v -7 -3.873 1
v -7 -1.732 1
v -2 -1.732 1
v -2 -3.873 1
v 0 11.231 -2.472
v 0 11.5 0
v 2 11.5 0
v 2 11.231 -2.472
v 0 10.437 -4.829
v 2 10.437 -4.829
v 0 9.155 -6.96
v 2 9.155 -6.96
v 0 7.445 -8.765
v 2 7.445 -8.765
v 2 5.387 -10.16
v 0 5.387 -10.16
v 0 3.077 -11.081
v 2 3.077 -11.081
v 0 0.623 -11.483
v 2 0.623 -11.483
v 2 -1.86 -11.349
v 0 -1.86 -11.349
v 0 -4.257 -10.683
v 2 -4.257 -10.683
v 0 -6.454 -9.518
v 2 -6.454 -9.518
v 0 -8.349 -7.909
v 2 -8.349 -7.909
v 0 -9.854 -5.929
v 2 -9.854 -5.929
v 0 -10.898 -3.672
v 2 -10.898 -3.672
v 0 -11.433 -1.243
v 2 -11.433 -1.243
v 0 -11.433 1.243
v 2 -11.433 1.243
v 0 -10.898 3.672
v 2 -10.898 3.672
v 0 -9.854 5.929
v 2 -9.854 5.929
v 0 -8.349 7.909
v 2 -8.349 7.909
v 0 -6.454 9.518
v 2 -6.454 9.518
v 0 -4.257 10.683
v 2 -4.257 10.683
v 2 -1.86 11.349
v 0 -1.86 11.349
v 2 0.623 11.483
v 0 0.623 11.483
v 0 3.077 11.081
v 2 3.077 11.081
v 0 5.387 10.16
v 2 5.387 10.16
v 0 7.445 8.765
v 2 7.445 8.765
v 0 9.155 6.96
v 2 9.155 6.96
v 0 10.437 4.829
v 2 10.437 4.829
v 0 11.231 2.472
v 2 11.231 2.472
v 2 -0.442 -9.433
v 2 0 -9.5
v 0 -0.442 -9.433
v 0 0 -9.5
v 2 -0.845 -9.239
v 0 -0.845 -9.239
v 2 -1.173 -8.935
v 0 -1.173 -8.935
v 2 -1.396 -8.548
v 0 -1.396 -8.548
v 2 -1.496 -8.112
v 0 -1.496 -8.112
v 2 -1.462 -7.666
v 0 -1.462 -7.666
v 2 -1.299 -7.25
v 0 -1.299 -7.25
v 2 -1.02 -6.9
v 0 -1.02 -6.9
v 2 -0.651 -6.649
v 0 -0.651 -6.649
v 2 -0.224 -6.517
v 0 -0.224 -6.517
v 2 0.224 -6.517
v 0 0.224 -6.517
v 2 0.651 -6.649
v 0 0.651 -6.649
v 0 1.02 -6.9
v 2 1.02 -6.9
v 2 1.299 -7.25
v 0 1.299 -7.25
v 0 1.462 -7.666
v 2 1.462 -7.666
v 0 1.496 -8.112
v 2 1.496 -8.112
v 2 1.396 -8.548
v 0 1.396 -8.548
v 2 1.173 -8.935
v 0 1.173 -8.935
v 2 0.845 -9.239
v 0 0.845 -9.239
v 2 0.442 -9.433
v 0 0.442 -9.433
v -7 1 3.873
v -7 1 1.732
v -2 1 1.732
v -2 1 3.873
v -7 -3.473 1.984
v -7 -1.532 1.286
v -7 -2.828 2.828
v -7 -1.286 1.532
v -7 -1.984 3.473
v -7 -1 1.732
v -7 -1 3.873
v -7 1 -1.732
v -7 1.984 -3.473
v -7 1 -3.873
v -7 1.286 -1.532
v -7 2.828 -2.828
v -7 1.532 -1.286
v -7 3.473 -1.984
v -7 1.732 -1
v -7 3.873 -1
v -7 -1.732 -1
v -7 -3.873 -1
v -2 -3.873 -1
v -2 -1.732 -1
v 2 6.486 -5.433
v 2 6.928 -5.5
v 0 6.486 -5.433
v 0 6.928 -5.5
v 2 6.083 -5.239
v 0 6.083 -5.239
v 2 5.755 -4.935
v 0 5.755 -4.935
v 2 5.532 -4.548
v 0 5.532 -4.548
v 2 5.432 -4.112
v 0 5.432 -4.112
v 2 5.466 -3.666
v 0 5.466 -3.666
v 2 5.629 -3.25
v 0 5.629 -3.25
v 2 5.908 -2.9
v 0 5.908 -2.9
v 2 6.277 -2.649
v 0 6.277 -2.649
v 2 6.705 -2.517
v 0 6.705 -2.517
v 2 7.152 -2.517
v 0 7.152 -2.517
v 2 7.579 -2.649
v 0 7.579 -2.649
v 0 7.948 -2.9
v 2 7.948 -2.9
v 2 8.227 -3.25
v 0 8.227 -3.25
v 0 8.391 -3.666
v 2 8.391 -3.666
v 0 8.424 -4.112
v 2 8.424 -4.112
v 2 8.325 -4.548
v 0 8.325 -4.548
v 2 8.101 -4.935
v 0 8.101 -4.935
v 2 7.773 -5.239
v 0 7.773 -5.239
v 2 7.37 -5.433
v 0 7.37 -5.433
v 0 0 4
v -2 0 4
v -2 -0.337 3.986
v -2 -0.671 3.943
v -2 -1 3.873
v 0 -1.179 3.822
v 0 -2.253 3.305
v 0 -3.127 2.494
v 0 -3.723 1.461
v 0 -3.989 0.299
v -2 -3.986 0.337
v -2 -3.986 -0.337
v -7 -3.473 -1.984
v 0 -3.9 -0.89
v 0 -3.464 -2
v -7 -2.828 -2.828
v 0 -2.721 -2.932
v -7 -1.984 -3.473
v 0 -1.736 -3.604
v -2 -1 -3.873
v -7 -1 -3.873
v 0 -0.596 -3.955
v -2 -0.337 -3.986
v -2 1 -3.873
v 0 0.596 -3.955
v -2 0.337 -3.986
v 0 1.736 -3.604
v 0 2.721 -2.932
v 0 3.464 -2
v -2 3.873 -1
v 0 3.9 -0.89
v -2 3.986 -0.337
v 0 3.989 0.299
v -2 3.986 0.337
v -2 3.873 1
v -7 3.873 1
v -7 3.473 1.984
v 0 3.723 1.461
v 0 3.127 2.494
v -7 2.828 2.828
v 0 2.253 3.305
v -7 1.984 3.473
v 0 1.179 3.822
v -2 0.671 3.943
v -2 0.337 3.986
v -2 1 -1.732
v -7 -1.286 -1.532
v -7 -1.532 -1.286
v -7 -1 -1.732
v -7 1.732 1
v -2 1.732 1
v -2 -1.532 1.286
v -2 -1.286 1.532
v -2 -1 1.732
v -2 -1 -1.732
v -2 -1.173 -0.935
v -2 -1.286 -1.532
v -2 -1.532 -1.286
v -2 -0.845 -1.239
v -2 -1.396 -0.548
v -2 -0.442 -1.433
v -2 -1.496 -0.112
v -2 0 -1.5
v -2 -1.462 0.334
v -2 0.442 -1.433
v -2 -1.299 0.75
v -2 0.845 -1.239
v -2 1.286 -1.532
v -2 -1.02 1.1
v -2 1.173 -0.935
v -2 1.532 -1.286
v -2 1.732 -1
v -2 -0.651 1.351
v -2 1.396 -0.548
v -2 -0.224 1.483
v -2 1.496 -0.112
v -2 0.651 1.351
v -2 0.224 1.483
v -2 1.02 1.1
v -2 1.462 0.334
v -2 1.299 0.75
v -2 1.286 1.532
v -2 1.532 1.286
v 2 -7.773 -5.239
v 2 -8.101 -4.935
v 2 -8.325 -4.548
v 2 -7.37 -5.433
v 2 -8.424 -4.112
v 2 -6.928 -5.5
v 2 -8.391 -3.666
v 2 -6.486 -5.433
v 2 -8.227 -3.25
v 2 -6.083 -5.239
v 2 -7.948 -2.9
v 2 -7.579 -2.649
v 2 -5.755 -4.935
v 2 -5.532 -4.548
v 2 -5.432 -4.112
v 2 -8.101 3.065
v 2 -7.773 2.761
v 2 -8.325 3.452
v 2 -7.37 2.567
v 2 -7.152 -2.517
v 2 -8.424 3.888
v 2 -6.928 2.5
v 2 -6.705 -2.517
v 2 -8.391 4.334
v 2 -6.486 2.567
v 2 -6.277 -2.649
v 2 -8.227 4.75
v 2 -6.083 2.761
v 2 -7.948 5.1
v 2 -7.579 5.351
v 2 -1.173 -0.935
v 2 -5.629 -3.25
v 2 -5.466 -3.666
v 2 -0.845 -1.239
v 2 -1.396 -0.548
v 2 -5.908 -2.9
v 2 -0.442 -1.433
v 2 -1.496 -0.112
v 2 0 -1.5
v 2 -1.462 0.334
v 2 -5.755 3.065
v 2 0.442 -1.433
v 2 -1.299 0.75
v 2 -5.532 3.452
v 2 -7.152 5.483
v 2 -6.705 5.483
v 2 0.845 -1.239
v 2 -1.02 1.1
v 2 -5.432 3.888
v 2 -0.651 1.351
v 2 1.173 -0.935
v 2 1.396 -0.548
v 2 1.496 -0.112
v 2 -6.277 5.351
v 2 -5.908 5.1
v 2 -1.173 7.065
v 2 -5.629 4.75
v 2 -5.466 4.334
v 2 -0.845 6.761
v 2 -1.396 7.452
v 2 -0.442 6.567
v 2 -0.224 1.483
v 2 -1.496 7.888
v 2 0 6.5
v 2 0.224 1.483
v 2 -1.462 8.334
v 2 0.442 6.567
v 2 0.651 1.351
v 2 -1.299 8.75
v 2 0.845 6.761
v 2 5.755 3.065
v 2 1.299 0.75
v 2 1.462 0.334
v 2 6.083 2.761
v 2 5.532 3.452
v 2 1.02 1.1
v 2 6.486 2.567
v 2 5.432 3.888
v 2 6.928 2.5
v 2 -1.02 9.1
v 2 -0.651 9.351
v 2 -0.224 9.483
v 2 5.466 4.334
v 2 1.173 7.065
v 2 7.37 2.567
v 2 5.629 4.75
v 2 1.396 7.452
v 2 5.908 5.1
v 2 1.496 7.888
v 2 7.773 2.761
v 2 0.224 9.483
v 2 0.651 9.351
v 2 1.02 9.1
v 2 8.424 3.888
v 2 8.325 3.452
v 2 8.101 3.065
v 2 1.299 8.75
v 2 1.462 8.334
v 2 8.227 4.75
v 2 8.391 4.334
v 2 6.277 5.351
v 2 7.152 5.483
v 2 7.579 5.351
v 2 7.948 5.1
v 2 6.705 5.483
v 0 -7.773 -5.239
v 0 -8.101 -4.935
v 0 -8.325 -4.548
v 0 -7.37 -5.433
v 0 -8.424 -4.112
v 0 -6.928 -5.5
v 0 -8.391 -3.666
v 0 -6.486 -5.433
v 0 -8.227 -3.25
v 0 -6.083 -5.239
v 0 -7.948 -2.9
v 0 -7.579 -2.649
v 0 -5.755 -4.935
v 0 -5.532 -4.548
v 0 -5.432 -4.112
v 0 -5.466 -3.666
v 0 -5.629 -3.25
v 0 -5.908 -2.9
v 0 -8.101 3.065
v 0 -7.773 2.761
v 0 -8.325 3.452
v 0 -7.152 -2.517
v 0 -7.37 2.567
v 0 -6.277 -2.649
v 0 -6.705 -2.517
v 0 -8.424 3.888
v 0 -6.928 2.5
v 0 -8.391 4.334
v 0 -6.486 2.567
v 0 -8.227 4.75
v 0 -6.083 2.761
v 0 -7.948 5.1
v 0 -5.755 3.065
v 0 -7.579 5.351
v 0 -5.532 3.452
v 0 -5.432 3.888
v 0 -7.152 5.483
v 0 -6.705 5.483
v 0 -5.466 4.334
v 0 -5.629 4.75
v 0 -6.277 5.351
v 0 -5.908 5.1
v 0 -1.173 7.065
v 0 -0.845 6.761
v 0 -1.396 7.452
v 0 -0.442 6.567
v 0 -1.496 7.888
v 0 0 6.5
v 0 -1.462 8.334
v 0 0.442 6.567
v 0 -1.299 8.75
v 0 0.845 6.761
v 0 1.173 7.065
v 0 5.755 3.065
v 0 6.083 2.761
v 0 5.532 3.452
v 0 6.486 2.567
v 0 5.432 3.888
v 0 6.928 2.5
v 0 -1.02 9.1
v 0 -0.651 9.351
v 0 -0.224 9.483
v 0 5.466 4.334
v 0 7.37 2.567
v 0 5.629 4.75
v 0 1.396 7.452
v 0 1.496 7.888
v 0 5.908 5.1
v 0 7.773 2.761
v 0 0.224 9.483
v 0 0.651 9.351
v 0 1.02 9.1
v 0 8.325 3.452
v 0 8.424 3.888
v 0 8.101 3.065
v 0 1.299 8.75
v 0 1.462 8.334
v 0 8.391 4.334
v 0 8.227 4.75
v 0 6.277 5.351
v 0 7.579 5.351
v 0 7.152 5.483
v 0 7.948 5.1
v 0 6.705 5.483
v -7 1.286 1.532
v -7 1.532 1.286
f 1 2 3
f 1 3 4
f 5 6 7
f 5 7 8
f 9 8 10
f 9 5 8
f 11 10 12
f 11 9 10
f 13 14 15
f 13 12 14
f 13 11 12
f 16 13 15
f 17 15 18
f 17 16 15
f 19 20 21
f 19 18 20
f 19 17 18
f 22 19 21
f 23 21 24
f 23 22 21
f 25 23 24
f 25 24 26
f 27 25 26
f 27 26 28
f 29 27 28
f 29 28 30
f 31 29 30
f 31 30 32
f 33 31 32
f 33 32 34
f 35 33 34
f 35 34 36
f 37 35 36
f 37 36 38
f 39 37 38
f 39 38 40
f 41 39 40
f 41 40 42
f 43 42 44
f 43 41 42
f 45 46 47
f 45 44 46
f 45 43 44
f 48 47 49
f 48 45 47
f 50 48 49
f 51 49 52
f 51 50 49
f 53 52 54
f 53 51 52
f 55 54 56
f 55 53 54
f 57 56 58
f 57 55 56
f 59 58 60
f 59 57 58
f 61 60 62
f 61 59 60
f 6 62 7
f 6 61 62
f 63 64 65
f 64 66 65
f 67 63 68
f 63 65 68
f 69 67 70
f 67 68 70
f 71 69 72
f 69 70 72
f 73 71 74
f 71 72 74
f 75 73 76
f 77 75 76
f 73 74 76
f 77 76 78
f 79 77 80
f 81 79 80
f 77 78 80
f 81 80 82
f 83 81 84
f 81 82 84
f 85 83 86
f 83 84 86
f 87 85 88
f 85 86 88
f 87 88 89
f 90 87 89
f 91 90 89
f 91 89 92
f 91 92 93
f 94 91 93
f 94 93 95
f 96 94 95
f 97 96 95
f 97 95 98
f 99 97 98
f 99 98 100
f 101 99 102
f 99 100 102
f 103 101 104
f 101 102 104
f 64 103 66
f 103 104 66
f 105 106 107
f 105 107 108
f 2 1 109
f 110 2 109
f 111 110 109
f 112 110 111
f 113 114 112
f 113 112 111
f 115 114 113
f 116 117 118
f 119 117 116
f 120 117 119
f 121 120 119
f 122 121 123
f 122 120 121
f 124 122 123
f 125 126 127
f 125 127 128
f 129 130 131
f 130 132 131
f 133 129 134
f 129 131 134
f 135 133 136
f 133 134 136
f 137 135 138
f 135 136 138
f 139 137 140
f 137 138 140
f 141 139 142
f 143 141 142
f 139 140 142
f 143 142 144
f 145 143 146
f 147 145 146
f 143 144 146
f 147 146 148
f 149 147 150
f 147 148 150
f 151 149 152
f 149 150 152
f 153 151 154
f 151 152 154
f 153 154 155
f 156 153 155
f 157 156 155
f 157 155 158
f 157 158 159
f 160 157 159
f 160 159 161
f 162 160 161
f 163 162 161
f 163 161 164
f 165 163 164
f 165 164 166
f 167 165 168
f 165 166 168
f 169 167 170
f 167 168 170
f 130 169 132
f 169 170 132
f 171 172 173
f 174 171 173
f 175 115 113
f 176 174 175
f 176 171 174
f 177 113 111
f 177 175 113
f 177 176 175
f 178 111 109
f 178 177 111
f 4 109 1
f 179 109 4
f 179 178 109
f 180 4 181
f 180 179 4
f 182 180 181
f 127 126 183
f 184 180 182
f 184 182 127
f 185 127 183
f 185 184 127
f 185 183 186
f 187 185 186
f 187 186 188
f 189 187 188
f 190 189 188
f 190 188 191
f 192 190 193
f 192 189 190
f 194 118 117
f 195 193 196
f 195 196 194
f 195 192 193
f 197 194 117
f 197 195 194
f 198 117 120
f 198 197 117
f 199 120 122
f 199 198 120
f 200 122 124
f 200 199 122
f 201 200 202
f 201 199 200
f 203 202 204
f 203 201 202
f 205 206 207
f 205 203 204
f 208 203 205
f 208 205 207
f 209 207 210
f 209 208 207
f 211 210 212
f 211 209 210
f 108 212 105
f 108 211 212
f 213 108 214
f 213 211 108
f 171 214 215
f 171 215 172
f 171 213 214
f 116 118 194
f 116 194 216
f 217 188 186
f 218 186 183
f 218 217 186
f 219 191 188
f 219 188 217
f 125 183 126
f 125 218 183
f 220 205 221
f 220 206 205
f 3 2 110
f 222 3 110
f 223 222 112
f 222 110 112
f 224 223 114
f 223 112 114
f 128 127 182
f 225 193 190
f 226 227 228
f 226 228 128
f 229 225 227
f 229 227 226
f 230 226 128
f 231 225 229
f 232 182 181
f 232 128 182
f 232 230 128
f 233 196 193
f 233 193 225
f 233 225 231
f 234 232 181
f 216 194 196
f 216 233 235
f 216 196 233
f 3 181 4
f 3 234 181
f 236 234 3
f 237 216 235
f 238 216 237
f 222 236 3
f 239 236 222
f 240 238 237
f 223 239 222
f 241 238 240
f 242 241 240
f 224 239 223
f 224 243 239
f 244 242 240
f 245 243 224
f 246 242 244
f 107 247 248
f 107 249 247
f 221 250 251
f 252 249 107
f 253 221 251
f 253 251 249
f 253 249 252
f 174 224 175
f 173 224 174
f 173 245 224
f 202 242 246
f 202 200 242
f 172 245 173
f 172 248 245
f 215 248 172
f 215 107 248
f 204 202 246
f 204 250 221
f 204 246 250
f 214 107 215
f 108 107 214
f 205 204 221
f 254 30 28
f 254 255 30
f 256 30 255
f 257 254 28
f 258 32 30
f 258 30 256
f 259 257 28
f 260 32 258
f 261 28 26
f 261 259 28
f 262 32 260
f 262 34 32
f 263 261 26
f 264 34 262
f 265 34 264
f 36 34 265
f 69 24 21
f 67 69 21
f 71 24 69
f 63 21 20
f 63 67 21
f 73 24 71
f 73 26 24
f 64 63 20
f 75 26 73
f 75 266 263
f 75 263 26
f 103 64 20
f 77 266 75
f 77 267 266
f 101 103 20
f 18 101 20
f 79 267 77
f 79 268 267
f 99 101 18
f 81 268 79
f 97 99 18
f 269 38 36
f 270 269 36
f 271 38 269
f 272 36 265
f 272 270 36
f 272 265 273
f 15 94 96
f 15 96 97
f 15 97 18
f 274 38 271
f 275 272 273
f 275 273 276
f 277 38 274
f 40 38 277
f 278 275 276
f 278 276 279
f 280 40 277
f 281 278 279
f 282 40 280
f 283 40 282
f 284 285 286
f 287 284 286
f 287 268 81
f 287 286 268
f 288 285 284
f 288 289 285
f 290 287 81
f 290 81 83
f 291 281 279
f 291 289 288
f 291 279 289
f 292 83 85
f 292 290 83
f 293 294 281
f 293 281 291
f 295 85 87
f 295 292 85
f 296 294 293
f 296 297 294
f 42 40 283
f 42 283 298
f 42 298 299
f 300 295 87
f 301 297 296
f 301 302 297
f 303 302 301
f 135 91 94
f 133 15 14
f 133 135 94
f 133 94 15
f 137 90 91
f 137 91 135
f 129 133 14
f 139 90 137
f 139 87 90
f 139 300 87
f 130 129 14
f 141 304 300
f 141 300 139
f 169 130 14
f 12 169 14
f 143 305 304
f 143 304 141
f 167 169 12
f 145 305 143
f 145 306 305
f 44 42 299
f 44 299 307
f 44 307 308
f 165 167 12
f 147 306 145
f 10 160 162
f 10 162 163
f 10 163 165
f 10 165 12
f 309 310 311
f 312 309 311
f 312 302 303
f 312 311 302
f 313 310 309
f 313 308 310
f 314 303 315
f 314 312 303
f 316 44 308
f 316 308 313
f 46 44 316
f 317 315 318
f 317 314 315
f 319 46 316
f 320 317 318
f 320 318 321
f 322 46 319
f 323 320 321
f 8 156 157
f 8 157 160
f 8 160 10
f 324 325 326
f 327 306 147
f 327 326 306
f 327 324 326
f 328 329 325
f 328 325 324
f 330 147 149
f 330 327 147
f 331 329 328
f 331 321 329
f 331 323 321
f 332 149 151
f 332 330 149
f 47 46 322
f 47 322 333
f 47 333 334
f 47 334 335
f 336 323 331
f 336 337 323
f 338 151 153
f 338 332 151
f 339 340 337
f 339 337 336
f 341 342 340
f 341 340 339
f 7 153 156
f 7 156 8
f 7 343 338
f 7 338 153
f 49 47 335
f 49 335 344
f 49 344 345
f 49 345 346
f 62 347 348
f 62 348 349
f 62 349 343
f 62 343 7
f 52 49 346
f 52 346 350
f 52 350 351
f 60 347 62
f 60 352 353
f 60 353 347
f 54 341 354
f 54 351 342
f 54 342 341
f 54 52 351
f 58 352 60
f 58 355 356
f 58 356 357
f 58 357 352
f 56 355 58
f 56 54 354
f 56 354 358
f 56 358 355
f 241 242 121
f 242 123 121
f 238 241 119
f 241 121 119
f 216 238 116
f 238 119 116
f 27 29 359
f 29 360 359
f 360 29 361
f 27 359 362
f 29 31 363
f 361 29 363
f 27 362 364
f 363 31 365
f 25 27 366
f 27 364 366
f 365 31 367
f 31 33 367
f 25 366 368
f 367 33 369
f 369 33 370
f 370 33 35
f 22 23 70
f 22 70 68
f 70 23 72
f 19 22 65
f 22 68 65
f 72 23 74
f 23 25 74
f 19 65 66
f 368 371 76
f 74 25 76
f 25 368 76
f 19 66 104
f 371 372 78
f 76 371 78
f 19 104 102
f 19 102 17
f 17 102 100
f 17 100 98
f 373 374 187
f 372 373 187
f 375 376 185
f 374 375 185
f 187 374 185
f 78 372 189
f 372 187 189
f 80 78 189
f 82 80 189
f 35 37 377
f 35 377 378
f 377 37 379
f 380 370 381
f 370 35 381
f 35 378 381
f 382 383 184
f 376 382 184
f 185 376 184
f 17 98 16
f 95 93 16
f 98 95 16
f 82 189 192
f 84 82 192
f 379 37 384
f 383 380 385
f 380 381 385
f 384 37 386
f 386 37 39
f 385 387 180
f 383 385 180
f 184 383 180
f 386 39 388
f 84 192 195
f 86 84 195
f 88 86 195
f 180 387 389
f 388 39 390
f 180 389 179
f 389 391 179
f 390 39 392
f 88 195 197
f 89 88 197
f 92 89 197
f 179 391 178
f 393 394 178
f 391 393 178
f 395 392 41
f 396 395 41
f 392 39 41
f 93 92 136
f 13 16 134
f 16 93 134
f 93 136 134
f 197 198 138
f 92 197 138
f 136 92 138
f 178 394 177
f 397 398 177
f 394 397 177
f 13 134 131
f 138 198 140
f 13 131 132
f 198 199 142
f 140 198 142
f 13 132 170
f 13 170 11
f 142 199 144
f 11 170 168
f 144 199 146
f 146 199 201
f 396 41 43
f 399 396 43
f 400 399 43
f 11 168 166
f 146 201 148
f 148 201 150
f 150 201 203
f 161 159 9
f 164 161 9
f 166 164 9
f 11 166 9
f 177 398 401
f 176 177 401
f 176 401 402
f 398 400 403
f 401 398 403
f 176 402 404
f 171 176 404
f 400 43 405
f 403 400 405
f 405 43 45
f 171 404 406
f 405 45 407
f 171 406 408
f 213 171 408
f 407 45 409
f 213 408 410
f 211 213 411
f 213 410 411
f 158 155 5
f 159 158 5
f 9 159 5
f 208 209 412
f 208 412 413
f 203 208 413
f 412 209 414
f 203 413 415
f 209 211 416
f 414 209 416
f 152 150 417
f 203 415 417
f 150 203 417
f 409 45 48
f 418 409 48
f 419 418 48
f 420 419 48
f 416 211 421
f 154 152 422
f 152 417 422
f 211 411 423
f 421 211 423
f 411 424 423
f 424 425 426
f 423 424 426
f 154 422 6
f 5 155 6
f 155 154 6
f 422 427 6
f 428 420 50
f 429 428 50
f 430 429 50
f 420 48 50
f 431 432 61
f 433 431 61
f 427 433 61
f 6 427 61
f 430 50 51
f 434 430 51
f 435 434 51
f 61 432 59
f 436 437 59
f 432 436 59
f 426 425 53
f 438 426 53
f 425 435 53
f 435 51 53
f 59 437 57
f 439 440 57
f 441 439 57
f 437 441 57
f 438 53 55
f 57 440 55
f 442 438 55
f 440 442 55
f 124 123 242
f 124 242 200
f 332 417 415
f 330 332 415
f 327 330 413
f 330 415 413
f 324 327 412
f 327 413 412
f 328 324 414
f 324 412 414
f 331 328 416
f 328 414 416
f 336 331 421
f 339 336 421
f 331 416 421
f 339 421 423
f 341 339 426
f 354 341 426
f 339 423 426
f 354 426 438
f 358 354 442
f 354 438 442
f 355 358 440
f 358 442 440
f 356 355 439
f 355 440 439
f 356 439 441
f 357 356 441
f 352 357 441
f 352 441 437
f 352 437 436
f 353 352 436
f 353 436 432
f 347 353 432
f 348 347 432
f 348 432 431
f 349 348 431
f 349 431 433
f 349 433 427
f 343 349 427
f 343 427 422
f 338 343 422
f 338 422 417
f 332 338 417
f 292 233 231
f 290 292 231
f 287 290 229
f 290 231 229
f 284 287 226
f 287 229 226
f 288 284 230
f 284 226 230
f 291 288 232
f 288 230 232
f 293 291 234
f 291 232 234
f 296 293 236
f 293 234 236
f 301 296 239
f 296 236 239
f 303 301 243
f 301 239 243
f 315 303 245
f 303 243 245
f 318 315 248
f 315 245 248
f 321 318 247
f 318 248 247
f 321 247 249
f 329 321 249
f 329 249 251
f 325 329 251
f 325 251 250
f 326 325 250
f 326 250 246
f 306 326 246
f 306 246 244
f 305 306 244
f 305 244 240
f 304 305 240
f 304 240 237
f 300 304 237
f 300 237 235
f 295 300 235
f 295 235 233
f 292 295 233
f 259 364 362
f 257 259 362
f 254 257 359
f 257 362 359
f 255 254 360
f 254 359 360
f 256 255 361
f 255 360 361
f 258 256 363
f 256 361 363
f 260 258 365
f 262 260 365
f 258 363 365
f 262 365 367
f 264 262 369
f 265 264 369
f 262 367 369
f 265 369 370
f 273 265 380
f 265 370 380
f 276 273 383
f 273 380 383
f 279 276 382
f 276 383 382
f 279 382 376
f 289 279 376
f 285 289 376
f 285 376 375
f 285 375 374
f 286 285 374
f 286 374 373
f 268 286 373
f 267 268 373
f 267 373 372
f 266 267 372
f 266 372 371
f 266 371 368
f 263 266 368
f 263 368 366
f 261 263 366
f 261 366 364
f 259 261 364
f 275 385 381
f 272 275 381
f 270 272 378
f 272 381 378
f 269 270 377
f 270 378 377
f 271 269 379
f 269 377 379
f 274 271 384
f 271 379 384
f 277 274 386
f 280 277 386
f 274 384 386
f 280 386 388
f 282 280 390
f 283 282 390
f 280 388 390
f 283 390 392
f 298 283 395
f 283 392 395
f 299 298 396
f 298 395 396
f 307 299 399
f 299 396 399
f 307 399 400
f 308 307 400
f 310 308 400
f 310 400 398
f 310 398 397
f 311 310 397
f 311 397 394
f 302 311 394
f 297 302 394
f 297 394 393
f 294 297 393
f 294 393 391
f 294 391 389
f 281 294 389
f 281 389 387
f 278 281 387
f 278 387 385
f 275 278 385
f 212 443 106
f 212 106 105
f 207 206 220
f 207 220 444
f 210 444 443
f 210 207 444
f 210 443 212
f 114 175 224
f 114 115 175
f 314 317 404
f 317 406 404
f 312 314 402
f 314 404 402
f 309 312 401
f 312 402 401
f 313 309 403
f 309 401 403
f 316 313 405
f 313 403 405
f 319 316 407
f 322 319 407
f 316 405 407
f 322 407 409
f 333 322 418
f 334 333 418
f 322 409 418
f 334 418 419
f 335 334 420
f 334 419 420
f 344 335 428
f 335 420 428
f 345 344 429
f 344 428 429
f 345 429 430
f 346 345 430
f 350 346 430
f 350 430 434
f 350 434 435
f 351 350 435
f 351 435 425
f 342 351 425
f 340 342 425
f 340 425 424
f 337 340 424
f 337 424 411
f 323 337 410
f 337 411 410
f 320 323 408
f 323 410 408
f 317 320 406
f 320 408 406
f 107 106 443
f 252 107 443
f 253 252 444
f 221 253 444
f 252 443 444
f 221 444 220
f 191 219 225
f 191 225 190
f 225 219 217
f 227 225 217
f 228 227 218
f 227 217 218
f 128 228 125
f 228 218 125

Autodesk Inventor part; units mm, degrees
ref_plane "YZ Plane" through (0, 0, 0) normal (1, 0, 0) x (0, 1, 0)
ref_plane "XZ Plane" through (0, 0, 0) normal (0, 1, 0) x (-1, 0, 0)
ref_plane "XY Plane" through (0, 0, 0) normal (0, 0, 1) x (1, 0, 0)
sketch "スケッチ1" plane through (0, 0, 0) normal (1, 0, 0) x (0, 1, 0)
  circle A0 centre (0, 0) radius 11.5
  dimension "d0" = 23
extrude "押し出し1" add sketch "スケッチ1" along normal blind 2
sketch "スケッチ4" plane through (0, 0, 0) normal (-1, 0, 0) x (0, 0, 1)
  circle A0 centre (0, 0) radius 4
  dimension "d22" = 8
extrude "押し出し2" add sketch "スケッチ4" along normal blind 7
sketch "スケッチ5" plane through (-7, 0, 0) normal (-1, 0, 0) x (0, 0, 1)
  line L0 (-4, 1) -> (4, 1)
  line L1 (4, 1) -> (4, -1)
  line L2 (4, -1) -> (-4, -1)
  line L3 (-4, -1) -> (-4, 1)
  line L4 (-1, 4) -> (1, 4)
  line L5 (1, 4) -> (1, -4)
  line L6 (1, -4) -> (-1, -4)
  line L7 (-1, -4) -> (-1, 4)
  circle A0 centre (0, 0) radius 4 projected
  circle A1 centre (0, 0) radius 2
  point P0 (0, 4)
  point P1 (4, 0)
  point P2 (1, 0)
  point P3 (0, 1)
  point P4 (1, 1)
  point P5 (-1, 1)
  point P6 (-1, -1)
  point P7 (1, -1)
  point P8 (-1, 1.7321)
  point P9 (-1.7321, 1)
  point P10 (1.7321, 1)
  point P11 (1, 1.7321)
  point P12 (-1.7321, -1)
  point P13 (-1, -1.7321)
  point P14 (1, -1.7321)
  point P15 (1.7321, -1)
  dimension "d25" = 2
  dimension "d26" = 2
  dimension "d29" = 4
extrude "押し出し3" cut sketch "スケッチ5" against normal blind 5 contours L0 A0 L3 | L0 A1 L2 A0 | A0 L2 L3 | A1 L7 L0 | L0 L7 L2 A1 | A0 L5 A1 L7 | L7 L4 A0 | L7 A1 L5 L0 | L0 L5 L2 L7 | L2 L7 A1 | L4 L5 A0 | A0 L6 L7 | L7 A1 L5 A0 | L5 A1 L0 | L0 A1 L2 L5 | L2 L5 A1 L7 | A0 L5 L6 | L0 A0 L2 A1 | L2 A1 L5 | L0 L1 A0 | L1 L2 A0
sketch "スケッチ2" plane through (2, 0, 0) normal (1, 0, 0) x (0, 0, -1)
  point P0 (0, 0)
  point P1 (0, 0)
hole "穴1" at (2, 0, 0) direction (-1, 0, 0) diameter 3 end through all
sketch "スケッチ3" plane through (2, 0, 0) normal (1, 0, 0) x (0, 0, -1)
  point P0 (0, 0)
  point P1 (8, 0)
  point P2 (4, 6.9282)
  point P3 (-4, 6.9282)
  point P4 (-8, 0)
  point P5 (-4, -6.9282)
  point P6 (4, -6.9282)
  dimension "d12" = 360
  dimension "d14" = 16
hole "穴2" at (2, 0, -8) at (2, 6.9282, -4) at (2, 6.9282, 4) at (2, 0, 8) at (2, -6.9282, 4) at (2, -6.9282, -4) direction (-1, 0, 0) diameter 3 end through all
equation "\"d25\" = d26"
properties part number "CircleArm"
